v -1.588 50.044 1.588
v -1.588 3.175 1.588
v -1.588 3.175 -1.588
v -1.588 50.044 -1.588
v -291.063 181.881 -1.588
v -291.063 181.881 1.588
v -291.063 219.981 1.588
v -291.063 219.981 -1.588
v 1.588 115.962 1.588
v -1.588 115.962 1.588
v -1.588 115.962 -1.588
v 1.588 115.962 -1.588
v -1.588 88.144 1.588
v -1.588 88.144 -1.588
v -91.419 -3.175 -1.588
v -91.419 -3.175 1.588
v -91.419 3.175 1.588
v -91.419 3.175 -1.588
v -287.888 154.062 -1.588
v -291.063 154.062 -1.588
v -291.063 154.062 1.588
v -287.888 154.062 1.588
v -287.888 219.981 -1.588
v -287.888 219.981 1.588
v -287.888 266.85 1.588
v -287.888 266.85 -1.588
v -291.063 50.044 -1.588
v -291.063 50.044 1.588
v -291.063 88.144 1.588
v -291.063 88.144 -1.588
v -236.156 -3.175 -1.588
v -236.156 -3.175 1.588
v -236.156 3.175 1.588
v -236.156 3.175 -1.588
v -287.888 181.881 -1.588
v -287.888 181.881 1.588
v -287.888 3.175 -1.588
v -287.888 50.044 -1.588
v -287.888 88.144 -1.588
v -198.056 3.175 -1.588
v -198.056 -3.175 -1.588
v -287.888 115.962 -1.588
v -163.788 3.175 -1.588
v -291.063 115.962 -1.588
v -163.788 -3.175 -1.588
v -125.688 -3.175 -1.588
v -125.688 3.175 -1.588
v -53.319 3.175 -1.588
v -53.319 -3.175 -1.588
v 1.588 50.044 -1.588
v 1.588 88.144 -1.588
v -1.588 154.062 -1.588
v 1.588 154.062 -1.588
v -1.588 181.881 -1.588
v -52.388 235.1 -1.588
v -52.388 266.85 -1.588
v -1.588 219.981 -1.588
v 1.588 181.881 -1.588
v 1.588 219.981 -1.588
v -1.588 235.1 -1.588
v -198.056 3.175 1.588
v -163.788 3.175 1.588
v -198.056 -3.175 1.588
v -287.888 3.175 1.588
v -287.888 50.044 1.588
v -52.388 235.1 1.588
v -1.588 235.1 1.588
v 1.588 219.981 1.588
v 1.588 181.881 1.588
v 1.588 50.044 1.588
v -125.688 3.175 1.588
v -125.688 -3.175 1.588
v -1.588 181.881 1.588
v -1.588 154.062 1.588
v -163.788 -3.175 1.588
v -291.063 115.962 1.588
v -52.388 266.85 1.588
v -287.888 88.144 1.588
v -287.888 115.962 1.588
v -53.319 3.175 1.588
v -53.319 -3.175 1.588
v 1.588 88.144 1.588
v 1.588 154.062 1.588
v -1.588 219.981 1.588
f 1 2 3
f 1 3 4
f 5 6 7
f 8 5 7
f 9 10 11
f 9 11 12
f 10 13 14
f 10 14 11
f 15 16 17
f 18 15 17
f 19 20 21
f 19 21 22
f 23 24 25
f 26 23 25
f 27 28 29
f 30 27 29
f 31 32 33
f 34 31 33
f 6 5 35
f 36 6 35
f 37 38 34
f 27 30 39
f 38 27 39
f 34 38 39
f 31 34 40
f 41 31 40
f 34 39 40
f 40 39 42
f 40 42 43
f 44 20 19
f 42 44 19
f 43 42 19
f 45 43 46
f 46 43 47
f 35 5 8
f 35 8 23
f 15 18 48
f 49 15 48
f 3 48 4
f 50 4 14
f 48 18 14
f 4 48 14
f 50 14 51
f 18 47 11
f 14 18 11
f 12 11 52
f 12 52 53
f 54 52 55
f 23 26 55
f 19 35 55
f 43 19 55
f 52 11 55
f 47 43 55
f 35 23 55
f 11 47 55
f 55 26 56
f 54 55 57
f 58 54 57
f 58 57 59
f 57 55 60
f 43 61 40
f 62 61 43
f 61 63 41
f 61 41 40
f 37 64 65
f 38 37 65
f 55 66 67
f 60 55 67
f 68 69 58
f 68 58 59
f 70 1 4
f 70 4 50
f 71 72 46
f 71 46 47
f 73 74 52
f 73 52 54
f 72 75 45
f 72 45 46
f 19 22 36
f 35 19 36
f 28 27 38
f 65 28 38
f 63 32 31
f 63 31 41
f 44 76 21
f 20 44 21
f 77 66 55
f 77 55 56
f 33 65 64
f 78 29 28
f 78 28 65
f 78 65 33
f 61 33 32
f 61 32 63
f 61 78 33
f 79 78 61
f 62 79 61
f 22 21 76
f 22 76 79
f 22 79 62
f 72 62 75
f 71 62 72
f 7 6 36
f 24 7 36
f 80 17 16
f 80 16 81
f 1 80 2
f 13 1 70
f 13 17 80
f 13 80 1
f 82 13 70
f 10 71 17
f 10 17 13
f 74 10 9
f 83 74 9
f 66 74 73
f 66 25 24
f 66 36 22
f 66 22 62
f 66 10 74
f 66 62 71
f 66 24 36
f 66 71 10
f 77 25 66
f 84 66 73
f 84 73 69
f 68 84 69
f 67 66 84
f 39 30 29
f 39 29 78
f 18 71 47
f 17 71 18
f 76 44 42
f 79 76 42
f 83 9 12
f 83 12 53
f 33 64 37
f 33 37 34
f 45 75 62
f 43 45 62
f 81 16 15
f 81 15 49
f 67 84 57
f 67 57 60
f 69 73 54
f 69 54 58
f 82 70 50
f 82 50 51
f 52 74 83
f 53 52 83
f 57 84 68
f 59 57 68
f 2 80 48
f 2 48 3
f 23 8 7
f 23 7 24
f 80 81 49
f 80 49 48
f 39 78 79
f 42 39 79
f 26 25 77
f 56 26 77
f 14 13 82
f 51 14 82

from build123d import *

# Parameters (mm, degrees)
SKETCH1_W           = 286.300000032
SKETCH1_H           = 263.675
BOSS_EXTRUDE1_DEPTH = 1.5875
SKETCH4_W           = 3.175
SKETCH4_H           = 38.1
SKETCH4_W_2         = 38.1
SKETCH4_H_2         = 6.35
BOSS_EXTRUDE2_DEPTH = 3.175
SKETCH3_W           = 50.8
SKETCH3_H           = 31.75
CUT_EXTRUDE2_DEPTH  = 3.175


with BuildPart() as part:
    # Sketch1 → Boss-Extrude1 (new body, symmetric)
    with BuildSketch(Plane.XY):
        with Locations((-144.737500016, 135.0125)):
            Rectangle(SKETCH1_W, SKETCH1_H)
    extrude(amount=BOSS_EXTRUDE1_DEPTH, both=True)

    # Sketch4 → Boss-Extrude2 (add)
    with BuildSketch(Plane.XY.offset(1.5875)):
        with Locations((-289.475000032, 200.93125)):
            Rectangle(SKETCH4_W, SKETCH4_H)
        with Locations((-289.475000032, 135.0125)):
            Rectangle(SKETCH4_W, SKETCH4_H)
        with Locations((-289.475000032, 69.09375)):
            Rectangle(SKETCH4_W, SKETCH4_H)
        with Locations((0, 200.93125)):
            Rectangle(SKETCH4_W, SKETCH4_H)
        with Locations((0, 135.0125)):
            Rectangle(SKETCH4_W, SKETCH4_H)
        with Locations((0, 69.09375)):
            Rectangle(SKETCH4_W, SKETCH4_H)
        with Locations((-217.106250024, 0)):
            Rectangle(SKETCH4_W_2, SKETCH4_H_2)
        with Locations((-144.737500016, 0)):
            Rectangle(SKETCH4_W_2, SKETCH4_H_2)
        with Locations((-72.368750008, 0)):
            Rectangle(SKETCH4_W_2, SKETCH4_H_2)
    extrude(amount=-BOSS_EXTRUDE2_DEPTH)

    # Sketch3 → Cut-Extrude2 (cut)
    with BuildSketch(Plane.XY.offset(1.5875)):
        with Locations((-26.9875, 250.975)):
            Rectangle(SKETCH3_W, SKETCH3_H)
    extrude(amount=-CUT_EXTRUDE2_DEPTH, mode=Mode.SUBTRACT)


solid = part.part
